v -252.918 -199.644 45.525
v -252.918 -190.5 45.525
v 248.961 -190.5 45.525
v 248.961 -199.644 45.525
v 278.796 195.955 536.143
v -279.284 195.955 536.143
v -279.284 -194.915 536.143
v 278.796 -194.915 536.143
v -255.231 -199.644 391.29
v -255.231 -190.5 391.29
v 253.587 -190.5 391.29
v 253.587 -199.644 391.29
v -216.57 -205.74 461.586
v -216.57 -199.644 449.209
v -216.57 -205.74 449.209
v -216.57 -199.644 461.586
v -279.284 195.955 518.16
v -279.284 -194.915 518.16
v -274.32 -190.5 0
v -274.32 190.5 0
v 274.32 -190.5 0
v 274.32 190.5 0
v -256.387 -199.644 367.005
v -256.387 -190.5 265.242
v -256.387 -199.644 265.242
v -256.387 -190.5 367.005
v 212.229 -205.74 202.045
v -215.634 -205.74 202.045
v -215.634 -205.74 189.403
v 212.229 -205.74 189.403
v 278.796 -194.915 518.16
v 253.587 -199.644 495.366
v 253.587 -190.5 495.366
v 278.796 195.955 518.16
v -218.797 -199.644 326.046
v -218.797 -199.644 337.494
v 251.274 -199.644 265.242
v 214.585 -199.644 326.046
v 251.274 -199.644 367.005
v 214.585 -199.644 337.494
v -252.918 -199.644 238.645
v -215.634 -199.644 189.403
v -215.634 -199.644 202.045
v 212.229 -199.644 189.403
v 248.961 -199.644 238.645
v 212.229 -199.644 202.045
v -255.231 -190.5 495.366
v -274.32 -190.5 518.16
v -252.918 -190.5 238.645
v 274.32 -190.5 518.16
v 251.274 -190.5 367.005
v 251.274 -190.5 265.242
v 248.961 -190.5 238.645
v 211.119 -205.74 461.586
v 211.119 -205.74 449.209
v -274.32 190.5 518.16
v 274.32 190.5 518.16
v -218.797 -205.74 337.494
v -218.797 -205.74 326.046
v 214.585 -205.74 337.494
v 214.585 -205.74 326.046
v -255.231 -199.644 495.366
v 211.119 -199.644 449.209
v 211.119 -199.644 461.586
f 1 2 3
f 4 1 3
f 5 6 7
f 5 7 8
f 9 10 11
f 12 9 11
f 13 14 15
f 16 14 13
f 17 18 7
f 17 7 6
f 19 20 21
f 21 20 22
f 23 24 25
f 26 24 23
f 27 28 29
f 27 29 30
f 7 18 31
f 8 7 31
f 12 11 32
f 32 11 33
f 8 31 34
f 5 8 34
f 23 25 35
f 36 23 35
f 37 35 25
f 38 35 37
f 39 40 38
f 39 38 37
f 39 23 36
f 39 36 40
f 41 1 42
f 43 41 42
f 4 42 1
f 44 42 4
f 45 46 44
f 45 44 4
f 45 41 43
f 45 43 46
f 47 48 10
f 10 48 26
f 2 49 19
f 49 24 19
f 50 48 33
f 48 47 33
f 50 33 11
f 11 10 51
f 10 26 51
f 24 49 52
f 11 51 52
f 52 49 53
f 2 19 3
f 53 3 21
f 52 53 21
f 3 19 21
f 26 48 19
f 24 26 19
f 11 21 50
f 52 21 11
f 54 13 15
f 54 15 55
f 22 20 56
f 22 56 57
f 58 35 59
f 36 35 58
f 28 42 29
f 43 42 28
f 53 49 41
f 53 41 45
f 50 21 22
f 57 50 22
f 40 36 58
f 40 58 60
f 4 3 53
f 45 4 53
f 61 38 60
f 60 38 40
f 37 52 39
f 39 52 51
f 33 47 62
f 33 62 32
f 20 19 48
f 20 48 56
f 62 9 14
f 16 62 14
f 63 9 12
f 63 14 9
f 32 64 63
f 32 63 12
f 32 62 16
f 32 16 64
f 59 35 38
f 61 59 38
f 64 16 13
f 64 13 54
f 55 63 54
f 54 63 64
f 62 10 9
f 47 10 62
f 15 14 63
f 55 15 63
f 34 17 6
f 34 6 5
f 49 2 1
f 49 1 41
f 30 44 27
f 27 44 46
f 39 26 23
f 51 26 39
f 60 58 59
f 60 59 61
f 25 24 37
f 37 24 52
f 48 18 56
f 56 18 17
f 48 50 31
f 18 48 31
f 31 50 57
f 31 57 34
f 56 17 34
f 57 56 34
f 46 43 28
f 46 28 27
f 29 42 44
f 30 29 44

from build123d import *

# Parameters (mm, degrees)
F0_W      = 548.64
F0_H      = 381
F1_DEPTH  = 518.16
F2_W      = 558.0791532993
F2_H      = 390.8702135086
F2_W_2    = 548.64
F2_H_2    = 381
F3_DEPTH  = 17.9832
F4_W      = 508.8175535202
F4_H      = 104.0762960911
F5_W      = 507.6611340046
F5_H      = 101.7635166645
F6_W      = 501.8791407347
F6_H      = 193.1193843484
F7_DEPTH  = 9.144
F10_W     = 427.862867713
F10_H     = 12.6414000988
F9_W      = 433.3813935518
F9_H      = 11.4478170872
F8_W      = 427.6882261038
F8_H      = 12.3768150806
F11_DEPTH = 6.096


with BuildPart() as f1:
    # F0 (on Top) → F1 (new body)
    with BuildSketch(Plane.XY):
        Rectangle(F0_W, F0_H)
    extrude(amount=F1_DEPTH)

    # F2 (on face) → F3 (join)
    with BuildSketch(Plane.XY.offset(518.16)):
        with Locations((-0.2440661192, 0.519618392)):
            Rectangle(F2_W, F2_H)
        Rectangle(F2_W_2, F2_H_2, mode=Mode.SUBTRACT)
        Rectangle(F2_W_2, F2_H_2)
    extrude(amount=F3_DEPTH)

    # F4 (on face) + F5 (on face) + F6 (on face) → F7 (join)
    with BuildSketch(Plane.XZ.offset(190.5)):
        with Locations((-0.822275877, 443.328037858)):
            Rectangle(F4_W, F4_H)
    with BuildSketch(Plane.XZ.offset(190.5)):
        with Locations((-2.5568753481, 316.123649478)):
            Rectangle(F5_W, F5_H)
    with BuildSketch(Plane.XZ.offset(190.5)):
        with Locations((-1.9786730409, 142.0849226415)):
            Rectangle(F6_W, F6_H)
    extrude(amount=F7_DEPTH)

    # F10 (on face) + F9 (on face) + F8 (on face) → F11 (join)
    with BuildSketch(Plane.XZ.offset(199.644)):
        with Locations((-1.7024800181, 195.7238912582)):
            Rectangle(F10_W, F10_H)
    with BuildSketch(Plane.XZ.offset(199.644)):
        with Locations((-2.1058097482, 331.7696303129)):
            Rectangle(F9_W, F9_H)
    with BuildSketch(Plane.XZ.offset(199.644)):
        with Locations((-2.7256086469, 455.3973823786)):
            Rectangle(F8_W, F8_H)
    extrude(amount=F11_DEPTH)


solid = f1.part
